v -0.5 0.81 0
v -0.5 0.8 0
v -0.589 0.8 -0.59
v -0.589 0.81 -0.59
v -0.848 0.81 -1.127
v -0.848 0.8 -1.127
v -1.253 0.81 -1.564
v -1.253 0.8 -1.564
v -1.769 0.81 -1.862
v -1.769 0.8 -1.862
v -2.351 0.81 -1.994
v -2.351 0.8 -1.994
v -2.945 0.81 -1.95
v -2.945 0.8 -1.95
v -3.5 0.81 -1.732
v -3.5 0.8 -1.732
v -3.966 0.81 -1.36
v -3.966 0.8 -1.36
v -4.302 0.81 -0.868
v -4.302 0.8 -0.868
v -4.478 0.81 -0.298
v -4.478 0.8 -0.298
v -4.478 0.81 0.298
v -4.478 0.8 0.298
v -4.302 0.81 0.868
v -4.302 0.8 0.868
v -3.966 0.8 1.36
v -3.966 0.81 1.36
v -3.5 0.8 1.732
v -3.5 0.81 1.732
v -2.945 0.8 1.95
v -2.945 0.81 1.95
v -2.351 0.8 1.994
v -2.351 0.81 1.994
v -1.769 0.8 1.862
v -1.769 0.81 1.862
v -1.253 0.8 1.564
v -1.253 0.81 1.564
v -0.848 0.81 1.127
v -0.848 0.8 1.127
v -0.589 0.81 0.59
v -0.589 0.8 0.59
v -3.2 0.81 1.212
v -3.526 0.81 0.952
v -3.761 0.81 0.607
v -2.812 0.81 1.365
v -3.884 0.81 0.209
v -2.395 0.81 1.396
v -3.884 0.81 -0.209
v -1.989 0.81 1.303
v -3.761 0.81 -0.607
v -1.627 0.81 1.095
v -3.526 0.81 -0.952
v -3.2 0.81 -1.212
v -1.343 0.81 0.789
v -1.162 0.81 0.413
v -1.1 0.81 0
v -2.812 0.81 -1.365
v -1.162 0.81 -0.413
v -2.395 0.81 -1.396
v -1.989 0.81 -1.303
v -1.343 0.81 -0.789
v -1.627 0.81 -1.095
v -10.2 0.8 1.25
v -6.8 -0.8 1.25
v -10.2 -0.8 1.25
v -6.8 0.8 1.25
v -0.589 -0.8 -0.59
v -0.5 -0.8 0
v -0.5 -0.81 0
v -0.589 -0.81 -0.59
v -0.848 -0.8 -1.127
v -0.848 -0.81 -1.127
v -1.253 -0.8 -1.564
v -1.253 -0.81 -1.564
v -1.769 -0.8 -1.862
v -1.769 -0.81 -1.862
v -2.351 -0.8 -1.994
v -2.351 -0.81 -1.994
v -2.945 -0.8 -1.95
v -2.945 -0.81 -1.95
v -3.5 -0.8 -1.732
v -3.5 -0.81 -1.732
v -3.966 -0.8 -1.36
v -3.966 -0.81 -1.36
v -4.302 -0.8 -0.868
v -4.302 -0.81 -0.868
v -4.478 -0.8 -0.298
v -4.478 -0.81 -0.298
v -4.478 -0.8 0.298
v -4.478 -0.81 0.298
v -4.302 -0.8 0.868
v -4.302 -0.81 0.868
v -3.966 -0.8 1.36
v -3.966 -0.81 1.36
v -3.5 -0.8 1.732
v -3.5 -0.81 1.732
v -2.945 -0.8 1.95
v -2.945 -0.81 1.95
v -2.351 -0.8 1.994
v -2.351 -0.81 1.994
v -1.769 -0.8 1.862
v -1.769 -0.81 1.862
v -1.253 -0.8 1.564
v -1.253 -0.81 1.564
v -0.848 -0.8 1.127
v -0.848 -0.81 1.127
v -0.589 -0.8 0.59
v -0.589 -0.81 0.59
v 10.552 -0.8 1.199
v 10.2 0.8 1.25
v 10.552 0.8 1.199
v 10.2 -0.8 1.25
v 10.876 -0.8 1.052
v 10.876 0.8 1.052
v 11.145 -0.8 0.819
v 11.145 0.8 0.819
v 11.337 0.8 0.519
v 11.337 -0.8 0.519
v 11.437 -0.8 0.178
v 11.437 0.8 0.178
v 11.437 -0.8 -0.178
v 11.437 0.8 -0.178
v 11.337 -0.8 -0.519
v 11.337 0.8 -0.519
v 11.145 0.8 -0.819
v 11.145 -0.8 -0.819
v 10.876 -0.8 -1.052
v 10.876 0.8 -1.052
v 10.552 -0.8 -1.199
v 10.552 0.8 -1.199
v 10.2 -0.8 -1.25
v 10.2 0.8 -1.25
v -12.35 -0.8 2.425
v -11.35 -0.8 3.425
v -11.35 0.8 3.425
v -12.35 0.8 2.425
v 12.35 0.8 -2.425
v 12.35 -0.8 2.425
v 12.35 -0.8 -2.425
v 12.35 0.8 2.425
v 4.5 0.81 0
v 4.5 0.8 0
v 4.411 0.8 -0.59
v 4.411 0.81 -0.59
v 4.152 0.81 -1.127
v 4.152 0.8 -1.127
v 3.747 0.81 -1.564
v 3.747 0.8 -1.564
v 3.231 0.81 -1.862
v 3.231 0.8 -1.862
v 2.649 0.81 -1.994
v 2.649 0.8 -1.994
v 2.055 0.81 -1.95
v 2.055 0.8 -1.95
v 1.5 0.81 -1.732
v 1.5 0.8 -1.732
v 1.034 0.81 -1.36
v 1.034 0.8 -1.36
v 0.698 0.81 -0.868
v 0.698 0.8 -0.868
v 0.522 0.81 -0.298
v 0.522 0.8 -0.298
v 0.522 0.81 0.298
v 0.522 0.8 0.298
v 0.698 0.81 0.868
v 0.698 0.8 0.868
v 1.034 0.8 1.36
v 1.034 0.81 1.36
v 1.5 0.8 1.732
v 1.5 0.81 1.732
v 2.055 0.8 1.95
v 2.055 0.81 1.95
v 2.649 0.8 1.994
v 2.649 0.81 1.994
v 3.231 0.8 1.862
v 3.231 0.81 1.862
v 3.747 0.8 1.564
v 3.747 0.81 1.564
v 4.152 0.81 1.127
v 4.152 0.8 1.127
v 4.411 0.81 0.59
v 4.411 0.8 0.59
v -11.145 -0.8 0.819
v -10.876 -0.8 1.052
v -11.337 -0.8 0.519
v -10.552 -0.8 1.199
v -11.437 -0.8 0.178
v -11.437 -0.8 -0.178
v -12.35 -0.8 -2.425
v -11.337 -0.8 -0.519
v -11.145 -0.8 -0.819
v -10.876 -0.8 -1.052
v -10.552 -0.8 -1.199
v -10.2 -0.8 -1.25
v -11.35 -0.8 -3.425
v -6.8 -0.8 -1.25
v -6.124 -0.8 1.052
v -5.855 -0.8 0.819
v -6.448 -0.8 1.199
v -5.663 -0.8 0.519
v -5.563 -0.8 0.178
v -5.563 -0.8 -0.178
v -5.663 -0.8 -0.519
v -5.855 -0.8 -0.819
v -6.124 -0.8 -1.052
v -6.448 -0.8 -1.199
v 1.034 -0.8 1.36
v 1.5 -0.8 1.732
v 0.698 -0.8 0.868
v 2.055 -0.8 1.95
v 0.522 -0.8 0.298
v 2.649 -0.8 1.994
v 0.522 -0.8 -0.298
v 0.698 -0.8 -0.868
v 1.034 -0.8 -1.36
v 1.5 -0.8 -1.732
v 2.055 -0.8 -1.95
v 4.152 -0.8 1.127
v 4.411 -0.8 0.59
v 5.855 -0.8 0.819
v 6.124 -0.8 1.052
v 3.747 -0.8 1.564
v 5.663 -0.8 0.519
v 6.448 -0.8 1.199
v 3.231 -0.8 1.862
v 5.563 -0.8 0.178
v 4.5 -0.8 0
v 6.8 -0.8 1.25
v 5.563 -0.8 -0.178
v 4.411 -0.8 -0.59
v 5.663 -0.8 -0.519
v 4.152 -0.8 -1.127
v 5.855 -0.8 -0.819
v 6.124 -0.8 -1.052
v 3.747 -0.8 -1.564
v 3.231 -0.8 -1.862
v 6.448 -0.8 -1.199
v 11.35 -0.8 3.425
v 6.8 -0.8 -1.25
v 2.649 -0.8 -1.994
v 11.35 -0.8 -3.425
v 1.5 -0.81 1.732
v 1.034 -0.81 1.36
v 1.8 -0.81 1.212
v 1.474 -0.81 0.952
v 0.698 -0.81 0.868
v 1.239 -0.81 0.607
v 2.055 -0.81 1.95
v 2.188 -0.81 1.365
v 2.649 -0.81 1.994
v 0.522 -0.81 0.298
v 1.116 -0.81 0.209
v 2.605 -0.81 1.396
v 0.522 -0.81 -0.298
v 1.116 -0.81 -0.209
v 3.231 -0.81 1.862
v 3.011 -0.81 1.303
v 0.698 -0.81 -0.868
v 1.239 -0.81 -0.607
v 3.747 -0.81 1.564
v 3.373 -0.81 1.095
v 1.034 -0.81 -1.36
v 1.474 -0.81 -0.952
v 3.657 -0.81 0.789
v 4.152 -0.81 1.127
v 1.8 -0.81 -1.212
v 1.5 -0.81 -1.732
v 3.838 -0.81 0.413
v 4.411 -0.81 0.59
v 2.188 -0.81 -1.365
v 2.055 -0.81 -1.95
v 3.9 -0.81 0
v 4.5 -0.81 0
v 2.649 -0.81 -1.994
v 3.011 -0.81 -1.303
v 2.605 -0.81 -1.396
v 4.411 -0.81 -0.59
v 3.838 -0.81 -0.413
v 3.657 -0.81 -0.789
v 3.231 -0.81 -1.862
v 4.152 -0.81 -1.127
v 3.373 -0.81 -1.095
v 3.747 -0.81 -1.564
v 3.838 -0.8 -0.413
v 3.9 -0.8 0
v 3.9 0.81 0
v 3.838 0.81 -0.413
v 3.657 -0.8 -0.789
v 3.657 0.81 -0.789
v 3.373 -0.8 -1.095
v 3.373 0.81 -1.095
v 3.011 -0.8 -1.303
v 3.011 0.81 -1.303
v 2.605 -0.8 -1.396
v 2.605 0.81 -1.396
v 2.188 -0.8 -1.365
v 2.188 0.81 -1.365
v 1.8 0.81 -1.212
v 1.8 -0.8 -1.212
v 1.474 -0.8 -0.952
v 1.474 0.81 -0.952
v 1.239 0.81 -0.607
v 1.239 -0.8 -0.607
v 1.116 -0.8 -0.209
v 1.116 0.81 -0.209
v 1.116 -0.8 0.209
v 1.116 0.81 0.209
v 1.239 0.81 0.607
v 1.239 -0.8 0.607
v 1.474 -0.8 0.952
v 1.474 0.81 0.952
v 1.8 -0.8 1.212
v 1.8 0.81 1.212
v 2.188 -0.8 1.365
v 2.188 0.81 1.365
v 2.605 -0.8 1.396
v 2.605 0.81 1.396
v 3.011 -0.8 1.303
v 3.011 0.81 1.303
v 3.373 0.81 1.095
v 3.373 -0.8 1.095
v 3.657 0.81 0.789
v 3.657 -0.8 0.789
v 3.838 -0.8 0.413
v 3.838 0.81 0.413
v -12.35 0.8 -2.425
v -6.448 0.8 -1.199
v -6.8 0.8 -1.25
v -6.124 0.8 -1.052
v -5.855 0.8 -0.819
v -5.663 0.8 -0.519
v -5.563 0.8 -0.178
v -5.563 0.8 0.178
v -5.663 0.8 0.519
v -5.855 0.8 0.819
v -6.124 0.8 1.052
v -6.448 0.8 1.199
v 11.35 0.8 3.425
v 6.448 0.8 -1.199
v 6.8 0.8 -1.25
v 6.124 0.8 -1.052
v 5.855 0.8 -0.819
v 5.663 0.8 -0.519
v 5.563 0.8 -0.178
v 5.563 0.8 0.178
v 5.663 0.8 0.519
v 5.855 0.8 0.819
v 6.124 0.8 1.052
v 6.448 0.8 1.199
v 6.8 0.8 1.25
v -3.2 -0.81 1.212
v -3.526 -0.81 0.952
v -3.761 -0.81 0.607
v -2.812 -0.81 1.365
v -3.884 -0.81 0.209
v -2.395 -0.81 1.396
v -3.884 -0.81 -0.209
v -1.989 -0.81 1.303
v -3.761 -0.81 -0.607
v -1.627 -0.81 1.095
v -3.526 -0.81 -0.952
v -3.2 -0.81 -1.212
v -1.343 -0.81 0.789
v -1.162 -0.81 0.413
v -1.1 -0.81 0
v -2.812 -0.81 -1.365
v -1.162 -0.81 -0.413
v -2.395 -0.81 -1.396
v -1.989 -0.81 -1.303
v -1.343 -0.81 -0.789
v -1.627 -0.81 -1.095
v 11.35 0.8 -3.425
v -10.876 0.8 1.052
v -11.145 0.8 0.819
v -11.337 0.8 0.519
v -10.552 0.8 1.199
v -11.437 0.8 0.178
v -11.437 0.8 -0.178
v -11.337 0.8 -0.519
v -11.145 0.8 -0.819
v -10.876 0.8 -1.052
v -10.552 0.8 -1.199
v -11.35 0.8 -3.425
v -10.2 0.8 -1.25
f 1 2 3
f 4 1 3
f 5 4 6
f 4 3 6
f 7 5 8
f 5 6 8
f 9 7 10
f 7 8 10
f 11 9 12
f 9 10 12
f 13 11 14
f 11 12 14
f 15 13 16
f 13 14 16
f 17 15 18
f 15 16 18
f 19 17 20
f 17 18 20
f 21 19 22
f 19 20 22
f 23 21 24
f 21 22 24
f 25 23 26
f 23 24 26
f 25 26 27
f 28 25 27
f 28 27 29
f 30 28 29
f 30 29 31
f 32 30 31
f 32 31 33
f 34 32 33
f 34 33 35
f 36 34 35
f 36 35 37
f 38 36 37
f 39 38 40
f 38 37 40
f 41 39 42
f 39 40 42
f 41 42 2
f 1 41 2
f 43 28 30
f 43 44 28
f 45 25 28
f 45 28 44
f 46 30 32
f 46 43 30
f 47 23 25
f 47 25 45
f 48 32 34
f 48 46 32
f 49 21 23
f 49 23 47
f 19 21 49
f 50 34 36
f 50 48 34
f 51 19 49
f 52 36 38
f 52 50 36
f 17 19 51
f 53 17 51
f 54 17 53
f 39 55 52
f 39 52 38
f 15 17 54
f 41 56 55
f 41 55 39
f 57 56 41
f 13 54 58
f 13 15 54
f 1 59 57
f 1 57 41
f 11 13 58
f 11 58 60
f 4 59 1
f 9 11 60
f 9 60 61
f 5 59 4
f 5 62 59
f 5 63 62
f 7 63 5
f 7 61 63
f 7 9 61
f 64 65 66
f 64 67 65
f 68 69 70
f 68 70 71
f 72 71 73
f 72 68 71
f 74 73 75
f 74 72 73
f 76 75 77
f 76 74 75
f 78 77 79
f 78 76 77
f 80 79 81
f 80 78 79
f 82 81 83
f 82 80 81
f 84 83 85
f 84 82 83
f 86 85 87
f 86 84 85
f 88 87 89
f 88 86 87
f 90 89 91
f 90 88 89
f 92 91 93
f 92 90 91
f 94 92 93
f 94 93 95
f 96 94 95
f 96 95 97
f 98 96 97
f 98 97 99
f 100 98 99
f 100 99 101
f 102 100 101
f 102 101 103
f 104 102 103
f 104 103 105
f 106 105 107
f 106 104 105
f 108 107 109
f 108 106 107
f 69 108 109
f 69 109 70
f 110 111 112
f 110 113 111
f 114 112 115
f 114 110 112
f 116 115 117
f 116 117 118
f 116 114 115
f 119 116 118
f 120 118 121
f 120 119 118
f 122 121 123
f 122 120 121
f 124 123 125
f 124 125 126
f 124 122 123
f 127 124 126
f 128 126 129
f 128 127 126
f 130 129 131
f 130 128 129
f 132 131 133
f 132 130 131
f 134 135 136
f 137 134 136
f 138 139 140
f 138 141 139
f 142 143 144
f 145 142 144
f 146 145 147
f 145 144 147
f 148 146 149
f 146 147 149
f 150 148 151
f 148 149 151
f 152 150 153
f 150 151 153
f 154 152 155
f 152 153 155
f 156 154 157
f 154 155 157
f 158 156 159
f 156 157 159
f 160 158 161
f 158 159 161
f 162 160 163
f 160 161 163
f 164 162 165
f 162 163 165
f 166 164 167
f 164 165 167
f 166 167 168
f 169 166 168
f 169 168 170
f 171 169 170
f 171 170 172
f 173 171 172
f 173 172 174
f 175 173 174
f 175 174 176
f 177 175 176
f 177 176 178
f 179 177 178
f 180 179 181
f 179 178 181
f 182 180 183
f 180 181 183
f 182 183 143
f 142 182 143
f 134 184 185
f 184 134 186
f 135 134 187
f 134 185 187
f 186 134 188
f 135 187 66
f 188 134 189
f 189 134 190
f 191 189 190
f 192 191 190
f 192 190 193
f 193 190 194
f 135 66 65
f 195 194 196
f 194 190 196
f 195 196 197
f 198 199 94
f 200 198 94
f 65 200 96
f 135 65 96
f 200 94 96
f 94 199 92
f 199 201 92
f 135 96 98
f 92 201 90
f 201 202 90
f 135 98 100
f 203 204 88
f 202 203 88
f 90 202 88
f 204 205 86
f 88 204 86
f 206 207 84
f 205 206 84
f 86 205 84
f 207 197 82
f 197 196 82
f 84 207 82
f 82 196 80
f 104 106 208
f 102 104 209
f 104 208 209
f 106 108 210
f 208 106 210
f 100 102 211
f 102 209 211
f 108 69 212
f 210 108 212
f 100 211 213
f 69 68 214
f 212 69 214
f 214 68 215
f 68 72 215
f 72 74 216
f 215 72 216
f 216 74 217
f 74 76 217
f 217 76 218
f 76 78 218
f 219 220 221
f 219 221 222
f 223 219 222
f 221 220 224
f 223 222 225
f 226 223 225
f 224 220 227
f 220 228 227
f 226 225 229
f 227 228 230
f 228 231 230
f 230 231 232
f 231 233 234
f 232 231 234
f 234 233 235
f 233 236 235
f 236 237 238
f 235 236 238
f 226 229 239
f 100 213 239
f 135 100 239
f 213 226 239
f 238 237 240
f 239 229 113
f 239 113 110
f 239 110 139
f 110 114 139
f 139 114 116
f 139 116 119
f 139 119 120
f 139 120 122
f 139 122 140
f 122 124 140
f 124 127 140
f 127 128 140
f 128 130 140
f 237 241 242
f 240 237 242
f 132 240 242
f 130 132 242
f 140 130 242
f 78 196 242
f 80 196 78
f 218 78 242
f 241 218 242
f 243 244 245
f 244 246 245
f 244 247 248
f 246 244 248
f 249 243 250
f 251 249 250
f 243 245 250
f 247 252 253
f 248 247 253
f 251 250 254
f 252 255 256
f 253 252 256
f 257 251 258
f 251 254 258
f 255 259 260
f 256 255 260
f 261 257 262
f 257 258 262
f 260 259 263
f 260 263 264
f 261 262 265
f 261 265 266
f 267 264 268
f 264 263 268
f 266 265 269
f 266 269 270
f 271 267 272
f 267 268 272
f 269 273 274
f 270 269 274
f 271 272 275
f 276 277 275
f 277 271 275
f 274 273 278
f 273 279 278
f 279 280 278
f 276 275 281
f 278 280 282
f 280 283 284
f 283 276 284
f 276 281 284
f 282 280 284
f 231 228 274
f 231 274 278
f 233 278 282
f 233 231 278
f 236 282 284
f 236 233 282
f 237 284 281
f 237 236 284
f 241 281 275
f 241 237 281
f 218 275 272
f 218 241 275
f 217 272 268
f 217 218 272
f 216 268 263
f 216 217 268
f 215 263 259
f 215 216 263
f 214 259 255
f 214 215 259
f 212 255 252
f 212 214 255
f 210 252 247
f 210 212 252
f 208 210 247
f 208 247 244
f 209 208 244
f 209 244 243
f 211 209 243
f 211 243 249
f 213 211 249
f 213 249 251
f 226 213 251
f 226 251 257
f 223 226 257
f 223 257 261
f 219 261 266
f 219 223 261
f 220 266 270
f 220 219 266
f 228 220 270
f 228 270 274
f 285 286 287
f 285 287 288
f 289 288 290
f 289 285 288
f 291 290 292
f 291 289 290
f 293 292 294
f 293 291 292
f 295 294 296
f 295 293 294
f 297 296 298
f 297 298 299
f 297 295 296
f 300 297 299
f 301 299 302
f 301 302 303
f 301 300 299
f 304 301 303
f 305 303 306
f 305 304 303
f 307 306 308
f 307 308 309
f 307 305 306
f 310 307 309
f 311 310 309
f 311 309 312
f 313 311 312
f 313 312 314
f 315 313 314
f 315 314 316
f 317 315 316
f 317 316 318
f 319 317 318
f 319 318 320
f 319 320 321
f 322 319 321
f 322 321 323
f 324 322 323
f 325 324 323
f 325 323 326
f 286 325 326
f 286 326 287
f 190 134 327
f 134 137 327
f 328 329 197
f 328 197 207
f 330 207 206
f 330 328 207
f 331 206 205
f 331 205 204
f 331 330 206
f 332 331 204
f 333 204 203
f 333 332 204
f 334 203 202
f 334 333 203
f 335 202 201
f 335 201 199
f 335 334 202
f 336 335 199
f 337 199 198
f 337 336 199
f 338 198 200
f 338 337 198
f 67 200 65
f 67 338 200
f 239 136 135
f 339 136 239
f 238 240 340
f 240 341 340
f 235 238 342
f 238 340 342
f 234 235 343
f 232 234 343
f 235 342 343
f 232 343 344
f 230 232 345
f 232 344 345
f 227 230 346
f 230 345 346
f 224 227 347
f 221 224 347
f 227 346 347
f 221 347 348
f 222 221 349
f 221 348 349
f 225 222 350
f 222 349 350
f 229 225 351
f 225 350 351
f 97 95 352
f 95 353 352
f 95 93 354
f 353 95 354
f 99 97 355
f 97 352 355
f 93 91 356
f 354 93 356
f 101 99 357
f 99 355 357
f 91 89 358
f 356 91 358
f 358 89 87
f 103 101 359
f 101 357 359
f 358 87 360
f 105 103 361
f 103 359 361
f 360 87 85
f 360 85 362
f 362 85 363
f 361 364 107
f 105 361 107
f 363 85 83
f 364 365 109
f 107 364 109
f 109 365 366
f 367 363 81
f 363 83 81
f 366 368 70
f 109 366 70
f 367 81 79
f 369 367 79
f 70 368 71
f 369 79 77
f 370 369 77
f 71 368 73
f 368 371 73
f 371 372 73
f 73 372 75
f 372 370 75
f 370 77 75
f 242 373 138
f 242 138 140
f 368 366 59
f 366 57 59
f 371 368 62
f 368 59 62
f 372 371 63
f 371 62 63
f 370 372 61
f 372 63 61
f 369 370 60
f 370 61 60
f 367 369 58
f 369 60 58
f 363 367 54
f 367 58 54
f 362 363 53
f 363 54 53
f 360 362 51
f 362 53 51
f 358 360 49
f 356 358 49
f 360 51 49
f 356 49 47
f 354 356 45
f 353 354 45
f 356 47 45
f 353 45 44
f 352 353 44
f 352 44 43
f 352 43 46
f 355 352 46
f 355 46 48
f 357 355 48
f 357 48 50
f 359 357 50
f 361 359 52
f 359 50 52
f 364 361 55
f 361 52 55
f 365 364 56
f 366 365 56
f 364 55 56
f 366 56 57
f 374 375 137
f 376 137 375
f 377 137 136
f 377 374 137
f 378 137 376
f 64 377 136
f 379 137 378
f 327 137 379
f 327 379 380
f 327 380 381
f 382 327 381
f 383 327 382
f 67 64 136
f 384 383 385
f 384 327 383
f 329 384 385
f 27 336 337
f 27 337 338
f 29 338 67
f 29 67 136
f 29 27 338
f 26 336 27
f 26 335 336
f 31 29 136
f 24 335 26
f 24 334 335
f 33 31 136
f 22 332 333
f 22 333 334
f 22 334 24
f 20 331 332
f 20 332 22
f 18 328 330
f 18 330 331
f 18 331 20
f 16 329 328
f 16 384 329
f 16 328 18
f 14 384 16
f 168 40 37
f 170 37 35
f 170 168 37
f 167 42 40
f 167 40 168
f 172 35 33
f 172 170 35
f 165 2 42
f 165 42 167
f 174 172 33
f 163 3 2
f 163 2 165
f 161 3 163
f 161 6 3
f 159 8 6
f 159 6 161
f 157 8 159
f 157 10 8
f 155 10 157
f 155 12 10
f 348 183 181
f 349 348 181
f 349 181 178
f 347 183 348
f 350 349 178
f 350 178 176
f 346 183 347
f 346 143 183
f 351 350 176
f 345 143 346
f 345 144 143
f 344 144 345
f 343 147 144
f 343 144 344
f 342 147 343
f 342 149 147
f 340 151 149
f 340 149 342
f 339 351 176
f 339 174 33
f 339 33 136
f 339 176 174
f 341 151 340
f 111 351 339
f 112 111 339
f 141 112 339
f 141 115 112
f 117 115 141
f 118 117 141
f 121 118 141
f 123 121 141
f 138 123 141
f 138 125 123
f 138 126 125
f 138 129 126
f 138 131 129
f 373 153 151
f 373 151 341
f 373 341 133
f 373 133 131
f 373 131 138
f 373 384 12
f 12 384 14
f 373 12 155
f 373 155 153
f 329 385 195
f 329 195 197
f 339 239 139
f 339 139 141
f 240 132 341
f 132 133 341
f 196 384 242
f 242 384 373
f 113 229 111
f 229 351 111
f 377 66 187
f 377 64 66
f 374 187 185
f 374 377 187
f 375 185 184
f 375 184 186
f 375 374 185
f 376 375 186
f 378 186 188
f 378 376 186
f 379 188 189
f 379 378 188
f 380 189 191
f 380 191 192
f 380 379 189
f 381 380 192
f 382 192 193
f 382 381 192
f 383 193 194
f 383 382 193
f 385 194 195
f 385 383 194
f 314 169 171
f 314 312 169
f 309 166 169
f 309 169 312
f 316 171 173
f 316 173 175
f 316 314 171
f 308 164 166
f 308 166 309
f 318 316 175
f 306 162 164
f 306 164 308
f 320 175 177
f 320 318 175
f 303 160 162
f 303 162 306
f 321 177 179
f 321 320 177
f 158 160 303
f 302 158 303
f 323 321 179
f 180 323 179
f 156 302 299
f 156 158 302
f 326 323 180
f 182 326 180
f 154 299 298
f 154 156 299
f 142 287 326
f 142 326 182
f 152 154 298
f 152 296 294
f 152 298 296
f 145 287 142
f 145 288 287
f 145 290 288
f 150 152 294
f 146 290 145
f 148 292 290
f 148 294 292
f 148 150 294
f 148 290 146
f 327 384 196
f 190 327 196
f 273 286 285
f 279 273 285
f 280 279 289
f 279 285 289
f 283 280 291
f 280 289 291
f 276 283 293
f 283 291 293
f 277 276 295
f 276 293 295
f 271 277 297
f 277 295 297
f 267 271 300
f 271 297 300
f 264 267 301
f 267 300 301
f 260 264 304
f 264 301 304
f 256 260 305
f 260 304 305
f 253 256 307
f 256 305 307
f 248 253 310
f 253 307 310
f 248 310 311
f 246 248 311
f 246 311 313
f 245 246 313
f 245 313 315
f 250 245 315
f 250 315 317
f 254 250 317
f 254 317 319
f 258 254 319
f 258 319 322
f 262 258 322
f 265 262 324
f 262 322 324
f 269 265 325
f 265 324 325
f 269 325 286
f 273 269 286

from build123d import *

# Parameters (mm, degrees)
SKETCH1_W           = 24.7
SKETCH1_H           = 6.85
SKETCH1_R           = 1.4
BOSS_EXTRUDE1_DEPTH = 0.8
CHAMFER1_SIZE       = 1
SKETCH2_R           = 2
SKETCH2_R_2         = 1.4
BOSS_EXTRUDE2_DEPTH = 0.01


with BuildPart() as part:
    # Sketch1 → Boss-Extrude1 (new body, symmetric)
    with BuildSketch(Plane(origin=(0, 0, 0), x_dir=(1, 0, 0), z_dir=(0, 1, 0))):
        Rectangle(SKETCH1_W, SKETCH1_H)
        with Locations((-2.5, 0)):
            Circle(SKETCH1_R, mode=Mode.SUBTRACT)
        with Locations((2.5, 0)):
            Circle(SKETCH1_R, mode=Mode.SUBTRACT)
        with BuildLine():
            Line((-10.2, 1.25), (-6.8, 1.25))
            ThreePointArc((-6.8, 1.25), (-5.55, 0), (-6.8, -1.25))
            Line((-6.8, -1.25), (-10.2, -1.25))
            ThreePointArc((-10.2, -1.25), (-11.45, 0), (-10.2, 1.25))
        make_face(mode=Mode.SUBTRACT)
        with BuildLine():
            Line((10.2, 1.25), (6.8, 1.25))
            ThreePointArc((6.8, 1.25), (5.55, 0), (6.8, -1.25))
            Line((6.8, -1.25), (10.2, -1.25))
            ThreePointArc((10.2, -1.25), (11.45, 0), (10.2, 1.25))
        make_face(mode=Mode.SUBTRACT)
    extrude(amount=BOSS_EXTRUDE1_DEPTH, both=True)

    # Chamfer1
    chamfer1_edges = [part.edges().sort_by_distance(p)[0] for p in [
        (12.35, 0, 3.425),
        (-12.35, 0, 3.425),
        (-12.35, 0, -3.425),
        (12.35, 0, -3.425),
    ]]
    chamfer(chamfer1_edges, length=CHAMFER1_SIZE)

    # Sketch2 → Boss-Extrude2 (add)
    with BuildSketch(Plane(origin=(0, 0.8, 0), x_dir=(1, 0, 0), z_dir=(0, 1, 0))):
        with Locations((-2.5, 0)):
            Circle(SKETCH2_R)
        with Locations((-2.5, 0)):
            Circle(SKETCH2_R_2, mode=Mode.SUBTRACT)
        with Locations((2.5, 0)):
            Circle(SKETCH2_R)
        with Locations((2.5, 0)):
            Circle(SKETCH2_R_2, mode=Mode.SUBTRACT)
    boss_extrude2 = extrude(amount=BOSS_EXTRUDE2_DEPTH)

    # Mirror1: Boss-Extrude2 across plane
    add(boss_extrude2.mirror(Plane.ZX))


solid = part.part
